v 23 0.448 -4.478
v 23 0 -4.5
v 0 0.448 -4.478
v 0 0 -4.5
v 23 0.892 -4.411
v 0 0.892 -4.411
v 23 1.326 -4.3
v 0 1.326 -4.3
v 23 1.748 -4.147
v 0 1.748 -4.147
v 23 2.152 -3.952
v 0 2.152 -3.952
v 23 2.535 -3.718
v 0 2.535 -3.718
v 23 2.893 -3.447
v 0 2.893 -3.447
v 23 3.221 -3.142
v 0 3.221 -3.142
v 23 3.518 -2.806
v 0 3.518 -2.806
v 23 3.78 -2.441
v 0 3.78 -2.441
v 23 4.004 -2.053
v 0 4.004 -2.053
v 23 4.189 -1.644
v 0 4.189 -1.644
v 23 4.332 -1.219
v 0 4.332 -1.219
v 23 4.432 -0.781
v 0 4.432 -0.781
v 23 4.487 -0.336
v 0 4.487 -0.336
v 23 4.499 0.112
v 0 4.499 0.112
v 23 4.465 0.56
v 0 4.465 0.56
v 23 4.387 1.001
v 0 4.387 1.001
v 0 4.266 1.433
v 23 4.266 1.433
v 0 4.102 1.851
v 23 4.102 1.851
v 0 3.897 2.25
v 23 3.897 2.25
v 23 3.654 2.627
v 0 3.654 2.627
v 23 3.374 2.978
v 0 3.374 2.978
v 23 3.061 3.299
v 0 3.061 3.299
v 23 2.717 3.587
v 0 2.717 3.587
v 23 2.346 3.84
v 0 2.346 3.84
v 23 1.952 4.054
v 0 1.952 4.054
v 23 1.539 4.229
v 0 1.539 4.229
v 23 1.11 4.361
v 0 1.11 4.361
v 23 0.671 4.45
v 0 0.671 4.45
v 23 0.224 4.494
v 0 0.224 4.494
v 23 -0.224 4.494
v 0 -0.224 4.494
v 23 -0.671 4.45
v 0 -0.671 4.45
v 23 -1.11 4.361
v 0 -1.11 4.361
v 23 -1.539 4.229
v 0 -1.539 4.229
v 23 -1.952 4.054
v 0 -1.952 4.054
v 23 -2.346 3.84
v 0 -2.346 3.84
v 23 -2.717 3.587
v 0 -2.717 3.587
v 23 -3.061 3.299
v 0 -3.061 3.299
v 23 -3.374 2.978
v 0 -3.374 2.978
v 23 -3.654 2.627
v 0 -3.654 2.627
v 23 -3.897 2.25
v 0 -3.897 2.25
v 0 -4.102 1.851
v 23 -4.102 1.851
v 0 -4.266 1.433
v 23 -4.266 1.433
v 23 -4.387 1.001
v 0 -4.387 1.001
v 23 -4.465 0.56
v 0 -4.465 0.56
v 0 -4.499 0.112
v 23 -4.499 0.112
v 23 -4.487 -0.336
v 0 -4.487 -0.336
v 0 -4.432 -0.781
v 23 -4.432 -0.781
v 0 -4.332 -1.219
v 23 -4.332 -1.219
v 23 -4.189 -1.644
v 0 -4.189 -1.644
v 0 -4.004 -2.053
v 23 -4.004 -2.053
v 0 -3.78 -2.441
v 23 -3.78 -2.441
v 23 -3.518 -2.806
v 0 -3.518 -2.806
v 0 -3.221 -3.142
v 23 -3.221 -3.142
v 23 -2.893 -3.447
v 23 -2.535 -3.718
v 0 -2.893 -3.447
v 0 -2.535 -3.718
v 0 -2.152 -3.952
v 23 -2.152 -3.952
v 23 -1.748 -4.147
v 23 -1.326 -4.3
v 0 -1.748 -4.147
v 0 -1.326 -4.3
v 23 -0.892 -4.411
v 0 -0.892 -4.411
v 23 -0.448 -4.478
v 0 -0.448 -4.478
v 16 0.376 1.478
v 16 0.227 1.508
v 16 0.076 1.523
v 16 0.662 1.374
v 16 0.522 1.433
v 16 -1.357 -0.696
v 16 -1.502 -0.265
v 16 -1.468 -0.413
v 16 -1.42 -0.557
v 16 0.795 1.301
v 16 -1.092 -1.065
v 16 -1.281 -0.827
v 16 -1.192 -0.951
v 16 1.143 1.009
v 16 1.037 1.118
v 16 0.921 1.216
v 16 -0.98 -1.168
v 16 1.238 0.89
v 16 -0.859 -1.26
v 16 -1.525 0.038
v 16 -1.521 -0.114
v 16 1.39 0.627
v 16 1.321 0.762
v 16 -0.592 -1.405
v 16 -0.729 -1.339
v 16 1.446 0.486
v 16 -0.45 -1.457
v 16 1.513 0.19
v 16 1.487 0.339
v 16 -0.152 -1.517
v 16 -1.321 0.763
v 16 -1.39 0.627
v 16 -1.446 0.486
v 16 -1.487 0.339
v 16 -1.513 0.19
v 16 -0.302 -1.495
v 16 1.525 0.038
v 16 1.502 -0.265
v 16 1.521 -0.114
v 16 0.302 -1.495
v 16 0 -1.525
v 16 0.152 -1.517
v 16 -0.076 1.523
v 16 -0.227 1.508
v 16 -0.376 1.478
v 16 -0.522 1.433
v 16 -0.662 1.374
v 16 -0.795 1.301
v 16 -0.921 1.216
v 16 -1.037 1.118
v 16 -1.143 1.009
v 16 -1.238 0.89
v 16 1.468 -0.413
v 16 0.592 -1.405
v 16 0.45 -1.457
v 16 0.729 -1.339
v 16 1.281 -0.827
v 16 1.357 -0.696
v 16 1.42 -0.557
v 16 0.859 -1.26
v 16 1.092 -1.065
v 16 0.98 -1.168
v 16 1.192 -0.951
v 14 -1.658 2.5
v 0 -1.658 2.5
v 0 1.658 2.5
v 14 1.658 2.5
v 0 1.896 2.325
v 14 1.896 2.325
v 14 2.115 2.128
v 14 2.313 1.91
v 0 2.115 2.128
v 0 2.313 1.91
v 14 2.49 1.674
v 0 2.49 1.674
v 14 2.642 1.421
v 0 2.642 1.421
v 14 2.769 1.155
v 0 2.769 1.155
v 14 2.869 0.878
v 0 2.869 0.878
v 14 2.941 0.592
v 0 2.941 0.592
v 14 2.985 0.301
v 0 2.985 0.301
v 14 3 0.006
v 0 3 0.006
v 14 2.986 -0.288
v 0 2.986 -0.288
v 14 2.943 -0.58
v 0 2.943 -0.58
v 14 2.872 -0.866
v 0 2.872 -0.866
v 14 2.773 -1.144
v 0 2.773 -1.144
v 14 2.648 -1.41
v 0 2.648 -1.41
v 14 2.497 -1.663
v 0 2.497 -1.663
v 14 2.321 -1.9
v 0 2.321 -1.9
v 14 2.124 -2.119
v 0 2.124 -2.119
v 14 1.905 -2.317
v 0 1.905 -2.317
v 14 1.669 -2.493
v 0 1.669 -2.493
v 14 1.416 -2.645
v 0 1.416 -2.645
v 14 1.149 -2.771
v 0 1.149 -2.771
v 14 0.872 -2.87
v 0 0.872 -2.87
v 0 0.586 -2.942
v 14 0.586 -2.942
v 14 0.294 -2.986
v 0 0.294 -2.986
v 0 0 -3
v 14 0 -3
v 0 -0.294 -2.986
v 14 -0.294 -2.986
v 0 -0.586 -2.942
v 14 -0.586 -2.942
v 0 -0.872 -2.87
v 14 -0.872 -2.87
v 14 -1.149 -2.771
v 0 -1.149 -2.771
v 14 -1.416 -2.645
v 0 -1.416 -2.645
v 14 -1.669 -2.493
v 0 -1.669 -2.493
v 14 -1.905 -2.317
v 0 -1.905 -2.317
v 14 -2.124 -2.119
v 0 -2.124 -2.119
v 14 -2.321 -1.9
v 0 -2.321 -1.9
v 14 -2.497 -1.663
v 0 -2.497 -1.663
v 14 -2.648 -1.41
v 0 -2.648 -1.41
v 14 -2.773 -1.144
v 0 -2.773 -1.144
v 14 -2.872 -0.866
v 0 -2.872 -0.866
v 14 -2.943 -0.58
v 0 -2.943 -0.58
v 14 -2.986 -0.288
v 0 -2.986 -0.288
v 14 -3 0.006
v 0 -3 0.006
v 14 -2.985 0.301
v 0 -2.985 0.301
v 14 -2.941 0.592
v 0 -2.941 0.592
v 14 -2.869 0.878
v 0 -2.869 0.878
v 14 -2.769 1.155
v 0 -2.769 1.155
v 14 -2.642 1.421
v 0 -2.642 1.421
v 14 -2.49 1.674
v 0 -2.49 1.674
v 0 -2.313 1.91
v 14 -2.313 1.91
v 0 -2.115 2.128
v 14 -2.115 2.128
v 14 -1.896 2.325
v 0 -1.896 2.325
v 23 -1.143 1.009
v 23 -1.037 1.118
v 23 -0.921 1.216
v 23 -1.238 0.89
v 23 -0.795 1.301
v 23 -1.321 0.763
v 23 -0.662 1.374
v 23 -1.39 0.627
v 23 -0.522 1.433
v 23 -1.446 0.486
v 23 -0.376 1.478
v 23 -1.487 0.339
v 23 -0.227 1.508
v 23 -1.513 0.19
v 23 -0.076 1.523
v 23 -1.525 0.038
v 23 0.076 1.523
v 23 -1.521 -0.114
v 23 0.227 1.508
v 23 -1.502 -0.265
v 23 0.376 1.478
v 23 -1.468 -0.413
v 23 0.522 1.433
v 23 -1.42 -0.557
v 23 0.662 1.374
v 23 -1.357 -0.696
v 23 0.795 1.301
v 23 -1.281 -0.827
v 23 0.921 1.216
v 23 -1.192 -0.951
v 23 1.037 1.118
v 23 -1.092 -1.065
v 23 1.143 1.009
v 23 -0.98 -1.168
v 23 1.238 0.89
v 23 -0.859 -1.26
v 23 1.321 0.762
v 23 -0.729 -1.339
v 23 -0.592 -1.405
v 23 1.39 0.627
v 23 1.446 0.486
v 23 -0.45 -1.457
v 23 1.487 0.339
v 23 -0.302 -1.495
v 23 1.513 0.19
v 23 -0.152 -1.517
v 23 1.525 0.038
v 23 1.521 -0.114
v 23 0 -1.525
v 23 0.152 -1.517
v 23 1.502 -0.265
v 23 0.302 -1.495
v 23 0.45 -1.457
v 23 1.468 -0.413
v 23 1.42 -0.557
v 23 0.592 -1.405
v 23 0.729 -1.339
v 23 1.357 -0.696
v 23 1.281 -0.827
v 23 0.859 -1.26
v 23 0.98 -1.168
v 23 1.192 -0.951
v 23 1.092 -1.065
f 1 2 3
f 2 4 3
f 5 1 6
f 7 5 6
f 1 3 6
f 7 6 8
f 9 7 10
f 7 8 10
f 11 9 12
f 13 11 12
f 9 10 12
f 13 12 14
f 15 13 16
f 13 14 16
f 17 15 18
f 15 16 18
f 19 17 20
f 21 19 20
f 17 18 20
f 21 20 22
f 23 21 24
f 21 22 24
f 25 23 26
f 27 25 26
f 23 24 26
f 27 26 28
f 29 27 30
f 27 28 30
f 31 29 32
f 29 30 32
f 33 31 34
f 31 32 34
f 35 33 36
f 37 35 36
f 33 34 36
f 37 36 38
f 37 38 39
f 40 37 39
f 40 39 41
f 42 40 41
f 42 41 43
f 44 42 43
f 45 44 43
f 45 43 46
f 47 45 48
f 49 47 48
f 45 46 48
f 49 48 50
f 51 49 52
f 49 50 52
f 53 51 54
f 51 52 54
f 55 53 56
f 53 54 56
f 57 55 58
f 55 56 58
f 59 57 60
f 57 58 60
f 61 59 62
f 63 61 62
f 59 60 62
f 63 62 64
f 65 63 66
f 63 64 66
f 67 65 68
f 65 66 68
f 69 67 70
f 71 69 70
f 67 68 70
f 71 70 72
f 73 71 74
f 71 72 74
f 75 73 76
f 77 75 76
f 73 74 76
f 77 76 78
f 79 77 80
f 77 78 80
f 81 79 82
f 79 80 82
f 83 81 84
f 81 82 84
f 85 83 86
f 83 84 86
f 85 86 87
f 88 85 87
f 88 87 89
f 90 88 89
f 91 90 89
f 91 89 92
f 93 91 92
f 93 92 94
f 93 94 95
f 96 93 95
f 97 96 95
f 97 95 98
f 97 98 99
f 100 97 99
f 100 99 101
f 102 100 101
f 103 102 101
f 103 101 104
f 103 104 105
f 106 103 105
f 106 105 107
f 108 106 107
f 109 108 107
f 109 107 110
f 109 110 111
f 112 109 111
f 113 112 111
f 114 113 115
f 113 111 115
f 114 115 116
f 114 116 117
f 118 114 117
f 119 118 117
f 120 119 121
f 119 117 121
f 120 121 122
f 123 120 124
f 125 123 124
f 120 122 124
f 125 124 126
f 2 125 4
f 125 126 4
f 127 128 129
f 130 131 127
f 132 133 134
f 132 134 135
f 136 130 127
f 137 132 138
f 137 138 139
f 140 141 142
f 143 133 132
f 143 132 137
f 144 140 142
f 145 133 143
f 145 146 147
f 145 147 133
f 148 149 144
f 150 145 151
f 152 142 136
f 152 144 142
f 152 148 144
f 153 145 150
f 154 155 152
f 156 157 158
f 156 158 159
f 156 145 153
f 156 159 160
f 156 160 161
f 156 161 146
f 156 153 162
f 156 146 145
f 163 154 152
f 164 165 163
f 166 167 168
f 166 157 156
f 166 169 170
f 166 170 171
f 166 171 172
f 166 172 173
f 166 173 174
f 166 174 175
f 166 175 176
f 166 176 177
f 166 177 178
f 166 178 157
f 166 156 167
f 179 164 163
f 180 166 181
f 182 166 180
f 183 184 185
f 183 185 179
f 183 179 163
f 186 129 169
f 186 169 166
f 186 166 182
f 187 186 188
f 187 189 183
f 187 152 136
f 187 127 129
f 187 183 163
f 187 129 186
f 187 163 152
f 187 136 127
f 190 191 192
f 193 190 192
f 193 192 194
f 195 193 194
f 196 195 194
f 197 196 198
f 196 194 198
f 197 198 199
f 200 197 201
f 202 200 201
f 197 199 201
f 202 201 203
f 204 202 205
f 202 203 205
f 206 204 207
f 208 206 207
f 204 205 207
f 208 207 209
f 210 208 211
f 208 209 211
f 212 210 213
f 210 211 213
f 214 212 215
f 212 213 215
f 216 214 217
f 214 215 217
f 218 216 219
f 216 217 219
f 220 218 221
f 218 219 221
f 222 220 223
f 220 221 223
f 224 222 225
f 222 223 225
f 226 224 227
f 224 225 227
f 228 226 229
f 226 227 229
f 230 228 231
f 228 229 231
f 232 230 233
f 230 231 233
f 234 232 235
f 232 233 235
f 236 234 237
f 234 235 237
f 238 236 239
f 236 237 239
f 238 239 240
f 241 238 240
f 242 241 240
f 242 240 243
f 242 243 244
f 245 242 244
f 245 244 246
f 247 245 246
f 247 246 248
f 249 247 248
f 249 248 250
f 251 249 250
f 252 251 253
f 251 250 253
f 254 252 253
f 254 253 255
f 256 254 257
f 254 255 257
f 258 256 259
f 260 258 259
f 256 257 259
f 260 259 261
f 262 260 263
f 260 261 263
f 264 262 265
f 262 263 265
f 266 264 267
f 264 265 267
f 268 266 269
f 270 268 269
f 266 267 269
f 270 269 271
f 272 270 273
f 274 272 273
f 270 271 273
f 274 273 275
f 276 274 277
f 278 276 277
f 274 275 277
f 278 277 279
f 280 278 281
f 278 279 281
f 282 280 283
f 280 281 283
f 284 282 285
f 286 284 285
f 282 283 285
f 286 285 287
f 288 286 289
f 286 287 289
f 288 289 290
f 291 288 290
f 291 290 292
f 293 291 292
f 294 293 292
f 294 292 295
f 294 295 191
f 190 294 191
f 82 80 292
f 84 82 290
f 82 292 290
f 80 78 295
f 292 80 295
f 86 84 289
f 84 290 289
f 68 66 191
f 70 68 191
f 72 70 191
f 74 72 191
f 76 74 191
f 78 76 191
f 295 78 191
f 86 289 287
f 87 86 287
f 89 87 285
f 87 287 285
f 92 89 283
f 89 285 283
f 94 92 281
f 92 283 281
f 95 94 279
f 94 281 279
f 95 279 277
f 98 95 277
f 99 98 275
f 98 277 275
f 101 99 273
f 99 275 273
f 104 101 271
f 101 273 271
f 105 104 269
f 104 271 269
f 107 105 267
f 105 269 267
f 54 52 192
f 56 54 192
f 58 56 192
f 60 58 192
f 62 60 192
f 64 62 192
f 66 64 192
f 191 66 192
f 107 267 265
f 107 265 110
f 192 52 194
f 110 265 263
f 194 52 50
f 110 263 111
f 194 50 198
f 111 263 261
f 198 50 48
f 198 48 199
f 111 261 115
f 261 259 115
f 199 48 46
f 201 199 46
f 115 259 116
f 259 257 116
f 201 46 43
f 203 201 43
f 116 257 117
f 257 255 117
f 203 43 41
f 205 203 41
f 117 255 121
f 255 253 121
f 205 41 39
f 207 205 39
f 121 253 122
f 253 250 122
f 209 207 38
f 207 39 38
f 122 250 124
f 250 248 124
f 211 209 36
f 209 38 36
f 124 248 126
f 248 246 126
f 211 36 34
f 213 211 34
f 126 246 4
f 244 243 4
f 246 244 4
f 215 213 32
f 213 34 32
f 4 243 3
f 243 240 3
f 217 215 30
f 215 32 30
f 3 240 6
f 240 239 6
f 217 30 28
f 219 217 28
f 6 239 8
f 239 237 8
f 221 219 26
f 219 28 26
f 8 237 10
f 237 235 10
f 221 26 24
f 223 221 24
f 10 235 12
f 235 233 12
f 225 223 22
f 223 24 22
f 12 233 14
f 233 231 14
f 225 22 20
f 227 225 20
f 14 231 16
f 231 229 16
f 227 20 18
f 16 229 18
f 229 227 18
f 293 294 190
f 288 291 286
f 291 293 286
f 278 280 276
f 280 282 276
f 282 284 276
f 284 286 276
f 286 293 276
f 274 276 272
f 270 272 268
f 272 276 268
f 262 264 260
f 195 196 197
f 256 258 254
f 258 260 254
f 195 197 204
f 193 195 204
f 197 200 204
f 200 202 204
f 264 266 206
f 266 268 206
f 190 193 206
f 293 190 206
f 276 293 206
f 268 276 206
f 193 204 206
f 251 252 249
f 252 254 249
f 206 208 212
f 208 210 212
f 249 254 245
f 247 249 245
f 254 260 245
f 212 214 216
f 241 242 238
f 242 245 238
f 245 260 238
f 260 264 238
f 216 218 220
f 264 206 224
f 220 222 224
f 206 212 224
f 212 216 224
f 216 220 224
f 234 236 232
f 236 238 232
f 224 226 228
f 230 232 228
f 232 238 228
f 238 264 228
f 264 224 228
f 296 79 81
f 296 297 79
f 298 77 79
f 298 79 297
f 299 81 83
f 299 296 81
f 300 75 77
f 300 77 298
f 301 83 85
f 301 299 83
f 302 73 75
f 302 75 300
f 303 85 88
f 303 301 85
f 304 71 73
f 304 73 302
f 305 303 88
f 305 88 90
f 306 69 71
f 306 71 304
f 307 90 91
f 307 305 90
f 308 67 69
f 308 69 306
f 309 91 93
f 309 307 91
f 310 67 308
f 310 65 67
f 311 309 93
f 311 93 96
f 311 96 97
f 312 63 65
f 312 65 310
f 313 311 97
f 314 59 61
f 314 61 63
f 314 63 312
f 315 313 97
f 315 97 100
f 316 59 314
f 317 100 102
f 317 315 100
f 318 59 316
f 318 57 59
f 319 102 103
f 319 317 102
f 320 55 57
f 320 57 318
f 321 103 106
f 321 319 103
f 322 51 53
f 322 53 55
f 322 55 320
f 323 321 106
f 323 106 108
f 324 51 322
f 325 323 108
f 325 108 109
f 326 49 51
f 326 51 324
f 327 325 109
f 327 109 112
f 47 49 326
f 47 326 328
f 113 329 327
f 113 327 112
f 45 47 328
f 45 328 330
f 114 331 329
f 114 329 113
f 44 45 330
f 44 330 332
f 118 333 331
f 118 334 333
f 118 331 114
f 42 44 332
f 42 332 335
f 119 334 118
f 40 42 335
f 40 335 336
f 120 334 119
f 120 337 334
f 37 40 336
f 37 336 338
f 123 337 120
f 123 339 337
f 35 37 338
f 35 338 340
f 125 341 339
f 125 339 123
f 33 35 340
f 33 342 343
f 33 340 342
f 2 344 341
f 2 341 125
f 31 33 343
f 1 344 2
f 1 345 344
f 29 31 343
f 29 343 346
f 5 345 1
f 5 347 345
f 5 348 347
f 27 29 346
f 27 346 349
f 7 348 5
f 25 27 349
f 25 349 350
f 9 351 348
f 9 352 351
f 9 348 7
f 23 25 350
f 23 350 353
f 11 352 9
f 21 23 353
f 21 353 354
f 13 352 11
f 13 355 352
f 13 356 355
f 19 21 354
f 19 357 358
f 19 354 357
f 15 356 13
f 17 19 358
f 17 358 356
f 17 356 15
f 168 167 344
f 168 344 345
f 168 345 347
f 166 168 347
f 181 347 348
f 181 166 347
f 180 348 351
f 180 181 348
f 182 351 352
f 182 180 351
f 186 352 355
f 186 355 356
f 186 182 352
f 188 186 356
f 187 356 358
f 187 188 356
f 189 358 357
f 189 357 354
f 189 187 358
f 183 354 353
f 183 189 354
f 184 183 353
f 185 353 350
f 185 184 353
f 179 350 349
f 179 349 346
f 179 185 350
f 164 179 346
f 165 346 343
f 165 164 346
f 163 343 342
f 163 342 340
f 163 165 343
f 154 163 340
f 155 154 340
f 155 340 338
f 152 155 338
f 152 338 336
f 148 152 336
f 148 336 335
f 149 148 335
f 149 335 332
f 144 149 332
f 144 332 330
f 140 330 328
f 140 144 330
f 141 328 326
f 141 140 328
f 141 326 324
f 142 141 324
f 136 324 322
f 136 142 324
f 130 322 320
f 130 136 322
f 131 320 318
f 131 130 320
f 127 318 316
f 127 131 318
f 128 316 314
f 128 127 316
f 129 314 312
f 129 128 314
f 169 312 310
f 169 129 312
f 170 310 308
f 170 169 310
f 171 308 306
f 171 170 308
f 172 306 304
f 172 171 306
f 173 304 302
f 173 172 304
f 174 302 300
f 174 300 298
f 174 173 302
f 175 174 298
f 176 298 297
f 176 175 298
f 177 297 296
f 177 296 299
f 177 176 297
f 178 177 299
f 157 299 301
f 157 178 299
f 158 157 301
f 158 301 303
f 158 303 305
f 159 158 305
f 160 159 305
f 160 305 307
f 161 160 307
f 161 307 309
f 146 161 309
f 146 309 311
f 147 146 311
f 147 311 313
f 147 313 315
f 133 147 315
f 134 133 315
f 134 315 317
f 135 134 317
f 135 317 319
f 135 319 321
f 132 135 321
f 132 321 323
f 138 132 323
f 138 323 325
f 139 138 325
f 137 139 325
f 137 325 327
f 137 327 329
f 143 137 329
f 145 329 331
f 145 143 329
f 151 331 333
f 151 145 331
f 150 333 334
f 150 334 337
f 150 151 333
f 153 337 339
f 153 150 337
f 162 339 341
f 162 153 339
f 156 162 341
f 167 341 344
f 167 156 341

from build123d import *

# Parameters (mm, degrees)
SKETCH1_R           = 4.5
BOSS_EXTRUDE1_DEPTH = 14
SKETCH2_R           = 4.5
BOSS_EXTRUDE2_DEPTH = 2
SKETCH3_R           = 4.5
SKETCH3_R_2         = 1.525
BOSS_EXTRUDE3_DEPTH = 7


with BuildPart() as part:
    # Sketch1 → Boss-Extrude1 (new body)
    with BuildSketch(Plane.YZ):
        with Locations(Location((0, 0, 0), (0, 0, 270))):
            Circle(SKETCH1_R)
        with BuildLine():
            Line((-1.658312395, 2.5), (1.658312395, 2.5))
            ThreePointArc((1.658312395, 2.5), (0, -3), (-1.658312395, 2.5))
        make_face(mode=Mode.SUBTRACT)
    extrude(amount=BOSS_EXTRUDE1_DEPTH)

    # Sketch2 → Boss-Extrude2 (add)
    with BuildSketch(Plane.YZ.offset(14)):
        with Locations(Location((0, 0, 0), (0, 0, 270))):
            Circle(SKETCH2_R)
    extrude(amount=BOSS_EXTRUDE2_DEPTH)

    # Sketch3 → Boss-Extrude3 (add)
    with BuildSketch(Plane.YZ.offset(16)):
        with Locations(Location((0, 0, 0), (0, 0, 270))):
            Circle(SKETCH3_R)
        with Locations(Location((0, 0, 0), (0, 0, 270))):
            Circle(SKETCH3_R_2, mode=Mode.SUBTRACT)
    extrude(amount=BOSS_EXTRUDE3_DEPTH)


solid = part.part
